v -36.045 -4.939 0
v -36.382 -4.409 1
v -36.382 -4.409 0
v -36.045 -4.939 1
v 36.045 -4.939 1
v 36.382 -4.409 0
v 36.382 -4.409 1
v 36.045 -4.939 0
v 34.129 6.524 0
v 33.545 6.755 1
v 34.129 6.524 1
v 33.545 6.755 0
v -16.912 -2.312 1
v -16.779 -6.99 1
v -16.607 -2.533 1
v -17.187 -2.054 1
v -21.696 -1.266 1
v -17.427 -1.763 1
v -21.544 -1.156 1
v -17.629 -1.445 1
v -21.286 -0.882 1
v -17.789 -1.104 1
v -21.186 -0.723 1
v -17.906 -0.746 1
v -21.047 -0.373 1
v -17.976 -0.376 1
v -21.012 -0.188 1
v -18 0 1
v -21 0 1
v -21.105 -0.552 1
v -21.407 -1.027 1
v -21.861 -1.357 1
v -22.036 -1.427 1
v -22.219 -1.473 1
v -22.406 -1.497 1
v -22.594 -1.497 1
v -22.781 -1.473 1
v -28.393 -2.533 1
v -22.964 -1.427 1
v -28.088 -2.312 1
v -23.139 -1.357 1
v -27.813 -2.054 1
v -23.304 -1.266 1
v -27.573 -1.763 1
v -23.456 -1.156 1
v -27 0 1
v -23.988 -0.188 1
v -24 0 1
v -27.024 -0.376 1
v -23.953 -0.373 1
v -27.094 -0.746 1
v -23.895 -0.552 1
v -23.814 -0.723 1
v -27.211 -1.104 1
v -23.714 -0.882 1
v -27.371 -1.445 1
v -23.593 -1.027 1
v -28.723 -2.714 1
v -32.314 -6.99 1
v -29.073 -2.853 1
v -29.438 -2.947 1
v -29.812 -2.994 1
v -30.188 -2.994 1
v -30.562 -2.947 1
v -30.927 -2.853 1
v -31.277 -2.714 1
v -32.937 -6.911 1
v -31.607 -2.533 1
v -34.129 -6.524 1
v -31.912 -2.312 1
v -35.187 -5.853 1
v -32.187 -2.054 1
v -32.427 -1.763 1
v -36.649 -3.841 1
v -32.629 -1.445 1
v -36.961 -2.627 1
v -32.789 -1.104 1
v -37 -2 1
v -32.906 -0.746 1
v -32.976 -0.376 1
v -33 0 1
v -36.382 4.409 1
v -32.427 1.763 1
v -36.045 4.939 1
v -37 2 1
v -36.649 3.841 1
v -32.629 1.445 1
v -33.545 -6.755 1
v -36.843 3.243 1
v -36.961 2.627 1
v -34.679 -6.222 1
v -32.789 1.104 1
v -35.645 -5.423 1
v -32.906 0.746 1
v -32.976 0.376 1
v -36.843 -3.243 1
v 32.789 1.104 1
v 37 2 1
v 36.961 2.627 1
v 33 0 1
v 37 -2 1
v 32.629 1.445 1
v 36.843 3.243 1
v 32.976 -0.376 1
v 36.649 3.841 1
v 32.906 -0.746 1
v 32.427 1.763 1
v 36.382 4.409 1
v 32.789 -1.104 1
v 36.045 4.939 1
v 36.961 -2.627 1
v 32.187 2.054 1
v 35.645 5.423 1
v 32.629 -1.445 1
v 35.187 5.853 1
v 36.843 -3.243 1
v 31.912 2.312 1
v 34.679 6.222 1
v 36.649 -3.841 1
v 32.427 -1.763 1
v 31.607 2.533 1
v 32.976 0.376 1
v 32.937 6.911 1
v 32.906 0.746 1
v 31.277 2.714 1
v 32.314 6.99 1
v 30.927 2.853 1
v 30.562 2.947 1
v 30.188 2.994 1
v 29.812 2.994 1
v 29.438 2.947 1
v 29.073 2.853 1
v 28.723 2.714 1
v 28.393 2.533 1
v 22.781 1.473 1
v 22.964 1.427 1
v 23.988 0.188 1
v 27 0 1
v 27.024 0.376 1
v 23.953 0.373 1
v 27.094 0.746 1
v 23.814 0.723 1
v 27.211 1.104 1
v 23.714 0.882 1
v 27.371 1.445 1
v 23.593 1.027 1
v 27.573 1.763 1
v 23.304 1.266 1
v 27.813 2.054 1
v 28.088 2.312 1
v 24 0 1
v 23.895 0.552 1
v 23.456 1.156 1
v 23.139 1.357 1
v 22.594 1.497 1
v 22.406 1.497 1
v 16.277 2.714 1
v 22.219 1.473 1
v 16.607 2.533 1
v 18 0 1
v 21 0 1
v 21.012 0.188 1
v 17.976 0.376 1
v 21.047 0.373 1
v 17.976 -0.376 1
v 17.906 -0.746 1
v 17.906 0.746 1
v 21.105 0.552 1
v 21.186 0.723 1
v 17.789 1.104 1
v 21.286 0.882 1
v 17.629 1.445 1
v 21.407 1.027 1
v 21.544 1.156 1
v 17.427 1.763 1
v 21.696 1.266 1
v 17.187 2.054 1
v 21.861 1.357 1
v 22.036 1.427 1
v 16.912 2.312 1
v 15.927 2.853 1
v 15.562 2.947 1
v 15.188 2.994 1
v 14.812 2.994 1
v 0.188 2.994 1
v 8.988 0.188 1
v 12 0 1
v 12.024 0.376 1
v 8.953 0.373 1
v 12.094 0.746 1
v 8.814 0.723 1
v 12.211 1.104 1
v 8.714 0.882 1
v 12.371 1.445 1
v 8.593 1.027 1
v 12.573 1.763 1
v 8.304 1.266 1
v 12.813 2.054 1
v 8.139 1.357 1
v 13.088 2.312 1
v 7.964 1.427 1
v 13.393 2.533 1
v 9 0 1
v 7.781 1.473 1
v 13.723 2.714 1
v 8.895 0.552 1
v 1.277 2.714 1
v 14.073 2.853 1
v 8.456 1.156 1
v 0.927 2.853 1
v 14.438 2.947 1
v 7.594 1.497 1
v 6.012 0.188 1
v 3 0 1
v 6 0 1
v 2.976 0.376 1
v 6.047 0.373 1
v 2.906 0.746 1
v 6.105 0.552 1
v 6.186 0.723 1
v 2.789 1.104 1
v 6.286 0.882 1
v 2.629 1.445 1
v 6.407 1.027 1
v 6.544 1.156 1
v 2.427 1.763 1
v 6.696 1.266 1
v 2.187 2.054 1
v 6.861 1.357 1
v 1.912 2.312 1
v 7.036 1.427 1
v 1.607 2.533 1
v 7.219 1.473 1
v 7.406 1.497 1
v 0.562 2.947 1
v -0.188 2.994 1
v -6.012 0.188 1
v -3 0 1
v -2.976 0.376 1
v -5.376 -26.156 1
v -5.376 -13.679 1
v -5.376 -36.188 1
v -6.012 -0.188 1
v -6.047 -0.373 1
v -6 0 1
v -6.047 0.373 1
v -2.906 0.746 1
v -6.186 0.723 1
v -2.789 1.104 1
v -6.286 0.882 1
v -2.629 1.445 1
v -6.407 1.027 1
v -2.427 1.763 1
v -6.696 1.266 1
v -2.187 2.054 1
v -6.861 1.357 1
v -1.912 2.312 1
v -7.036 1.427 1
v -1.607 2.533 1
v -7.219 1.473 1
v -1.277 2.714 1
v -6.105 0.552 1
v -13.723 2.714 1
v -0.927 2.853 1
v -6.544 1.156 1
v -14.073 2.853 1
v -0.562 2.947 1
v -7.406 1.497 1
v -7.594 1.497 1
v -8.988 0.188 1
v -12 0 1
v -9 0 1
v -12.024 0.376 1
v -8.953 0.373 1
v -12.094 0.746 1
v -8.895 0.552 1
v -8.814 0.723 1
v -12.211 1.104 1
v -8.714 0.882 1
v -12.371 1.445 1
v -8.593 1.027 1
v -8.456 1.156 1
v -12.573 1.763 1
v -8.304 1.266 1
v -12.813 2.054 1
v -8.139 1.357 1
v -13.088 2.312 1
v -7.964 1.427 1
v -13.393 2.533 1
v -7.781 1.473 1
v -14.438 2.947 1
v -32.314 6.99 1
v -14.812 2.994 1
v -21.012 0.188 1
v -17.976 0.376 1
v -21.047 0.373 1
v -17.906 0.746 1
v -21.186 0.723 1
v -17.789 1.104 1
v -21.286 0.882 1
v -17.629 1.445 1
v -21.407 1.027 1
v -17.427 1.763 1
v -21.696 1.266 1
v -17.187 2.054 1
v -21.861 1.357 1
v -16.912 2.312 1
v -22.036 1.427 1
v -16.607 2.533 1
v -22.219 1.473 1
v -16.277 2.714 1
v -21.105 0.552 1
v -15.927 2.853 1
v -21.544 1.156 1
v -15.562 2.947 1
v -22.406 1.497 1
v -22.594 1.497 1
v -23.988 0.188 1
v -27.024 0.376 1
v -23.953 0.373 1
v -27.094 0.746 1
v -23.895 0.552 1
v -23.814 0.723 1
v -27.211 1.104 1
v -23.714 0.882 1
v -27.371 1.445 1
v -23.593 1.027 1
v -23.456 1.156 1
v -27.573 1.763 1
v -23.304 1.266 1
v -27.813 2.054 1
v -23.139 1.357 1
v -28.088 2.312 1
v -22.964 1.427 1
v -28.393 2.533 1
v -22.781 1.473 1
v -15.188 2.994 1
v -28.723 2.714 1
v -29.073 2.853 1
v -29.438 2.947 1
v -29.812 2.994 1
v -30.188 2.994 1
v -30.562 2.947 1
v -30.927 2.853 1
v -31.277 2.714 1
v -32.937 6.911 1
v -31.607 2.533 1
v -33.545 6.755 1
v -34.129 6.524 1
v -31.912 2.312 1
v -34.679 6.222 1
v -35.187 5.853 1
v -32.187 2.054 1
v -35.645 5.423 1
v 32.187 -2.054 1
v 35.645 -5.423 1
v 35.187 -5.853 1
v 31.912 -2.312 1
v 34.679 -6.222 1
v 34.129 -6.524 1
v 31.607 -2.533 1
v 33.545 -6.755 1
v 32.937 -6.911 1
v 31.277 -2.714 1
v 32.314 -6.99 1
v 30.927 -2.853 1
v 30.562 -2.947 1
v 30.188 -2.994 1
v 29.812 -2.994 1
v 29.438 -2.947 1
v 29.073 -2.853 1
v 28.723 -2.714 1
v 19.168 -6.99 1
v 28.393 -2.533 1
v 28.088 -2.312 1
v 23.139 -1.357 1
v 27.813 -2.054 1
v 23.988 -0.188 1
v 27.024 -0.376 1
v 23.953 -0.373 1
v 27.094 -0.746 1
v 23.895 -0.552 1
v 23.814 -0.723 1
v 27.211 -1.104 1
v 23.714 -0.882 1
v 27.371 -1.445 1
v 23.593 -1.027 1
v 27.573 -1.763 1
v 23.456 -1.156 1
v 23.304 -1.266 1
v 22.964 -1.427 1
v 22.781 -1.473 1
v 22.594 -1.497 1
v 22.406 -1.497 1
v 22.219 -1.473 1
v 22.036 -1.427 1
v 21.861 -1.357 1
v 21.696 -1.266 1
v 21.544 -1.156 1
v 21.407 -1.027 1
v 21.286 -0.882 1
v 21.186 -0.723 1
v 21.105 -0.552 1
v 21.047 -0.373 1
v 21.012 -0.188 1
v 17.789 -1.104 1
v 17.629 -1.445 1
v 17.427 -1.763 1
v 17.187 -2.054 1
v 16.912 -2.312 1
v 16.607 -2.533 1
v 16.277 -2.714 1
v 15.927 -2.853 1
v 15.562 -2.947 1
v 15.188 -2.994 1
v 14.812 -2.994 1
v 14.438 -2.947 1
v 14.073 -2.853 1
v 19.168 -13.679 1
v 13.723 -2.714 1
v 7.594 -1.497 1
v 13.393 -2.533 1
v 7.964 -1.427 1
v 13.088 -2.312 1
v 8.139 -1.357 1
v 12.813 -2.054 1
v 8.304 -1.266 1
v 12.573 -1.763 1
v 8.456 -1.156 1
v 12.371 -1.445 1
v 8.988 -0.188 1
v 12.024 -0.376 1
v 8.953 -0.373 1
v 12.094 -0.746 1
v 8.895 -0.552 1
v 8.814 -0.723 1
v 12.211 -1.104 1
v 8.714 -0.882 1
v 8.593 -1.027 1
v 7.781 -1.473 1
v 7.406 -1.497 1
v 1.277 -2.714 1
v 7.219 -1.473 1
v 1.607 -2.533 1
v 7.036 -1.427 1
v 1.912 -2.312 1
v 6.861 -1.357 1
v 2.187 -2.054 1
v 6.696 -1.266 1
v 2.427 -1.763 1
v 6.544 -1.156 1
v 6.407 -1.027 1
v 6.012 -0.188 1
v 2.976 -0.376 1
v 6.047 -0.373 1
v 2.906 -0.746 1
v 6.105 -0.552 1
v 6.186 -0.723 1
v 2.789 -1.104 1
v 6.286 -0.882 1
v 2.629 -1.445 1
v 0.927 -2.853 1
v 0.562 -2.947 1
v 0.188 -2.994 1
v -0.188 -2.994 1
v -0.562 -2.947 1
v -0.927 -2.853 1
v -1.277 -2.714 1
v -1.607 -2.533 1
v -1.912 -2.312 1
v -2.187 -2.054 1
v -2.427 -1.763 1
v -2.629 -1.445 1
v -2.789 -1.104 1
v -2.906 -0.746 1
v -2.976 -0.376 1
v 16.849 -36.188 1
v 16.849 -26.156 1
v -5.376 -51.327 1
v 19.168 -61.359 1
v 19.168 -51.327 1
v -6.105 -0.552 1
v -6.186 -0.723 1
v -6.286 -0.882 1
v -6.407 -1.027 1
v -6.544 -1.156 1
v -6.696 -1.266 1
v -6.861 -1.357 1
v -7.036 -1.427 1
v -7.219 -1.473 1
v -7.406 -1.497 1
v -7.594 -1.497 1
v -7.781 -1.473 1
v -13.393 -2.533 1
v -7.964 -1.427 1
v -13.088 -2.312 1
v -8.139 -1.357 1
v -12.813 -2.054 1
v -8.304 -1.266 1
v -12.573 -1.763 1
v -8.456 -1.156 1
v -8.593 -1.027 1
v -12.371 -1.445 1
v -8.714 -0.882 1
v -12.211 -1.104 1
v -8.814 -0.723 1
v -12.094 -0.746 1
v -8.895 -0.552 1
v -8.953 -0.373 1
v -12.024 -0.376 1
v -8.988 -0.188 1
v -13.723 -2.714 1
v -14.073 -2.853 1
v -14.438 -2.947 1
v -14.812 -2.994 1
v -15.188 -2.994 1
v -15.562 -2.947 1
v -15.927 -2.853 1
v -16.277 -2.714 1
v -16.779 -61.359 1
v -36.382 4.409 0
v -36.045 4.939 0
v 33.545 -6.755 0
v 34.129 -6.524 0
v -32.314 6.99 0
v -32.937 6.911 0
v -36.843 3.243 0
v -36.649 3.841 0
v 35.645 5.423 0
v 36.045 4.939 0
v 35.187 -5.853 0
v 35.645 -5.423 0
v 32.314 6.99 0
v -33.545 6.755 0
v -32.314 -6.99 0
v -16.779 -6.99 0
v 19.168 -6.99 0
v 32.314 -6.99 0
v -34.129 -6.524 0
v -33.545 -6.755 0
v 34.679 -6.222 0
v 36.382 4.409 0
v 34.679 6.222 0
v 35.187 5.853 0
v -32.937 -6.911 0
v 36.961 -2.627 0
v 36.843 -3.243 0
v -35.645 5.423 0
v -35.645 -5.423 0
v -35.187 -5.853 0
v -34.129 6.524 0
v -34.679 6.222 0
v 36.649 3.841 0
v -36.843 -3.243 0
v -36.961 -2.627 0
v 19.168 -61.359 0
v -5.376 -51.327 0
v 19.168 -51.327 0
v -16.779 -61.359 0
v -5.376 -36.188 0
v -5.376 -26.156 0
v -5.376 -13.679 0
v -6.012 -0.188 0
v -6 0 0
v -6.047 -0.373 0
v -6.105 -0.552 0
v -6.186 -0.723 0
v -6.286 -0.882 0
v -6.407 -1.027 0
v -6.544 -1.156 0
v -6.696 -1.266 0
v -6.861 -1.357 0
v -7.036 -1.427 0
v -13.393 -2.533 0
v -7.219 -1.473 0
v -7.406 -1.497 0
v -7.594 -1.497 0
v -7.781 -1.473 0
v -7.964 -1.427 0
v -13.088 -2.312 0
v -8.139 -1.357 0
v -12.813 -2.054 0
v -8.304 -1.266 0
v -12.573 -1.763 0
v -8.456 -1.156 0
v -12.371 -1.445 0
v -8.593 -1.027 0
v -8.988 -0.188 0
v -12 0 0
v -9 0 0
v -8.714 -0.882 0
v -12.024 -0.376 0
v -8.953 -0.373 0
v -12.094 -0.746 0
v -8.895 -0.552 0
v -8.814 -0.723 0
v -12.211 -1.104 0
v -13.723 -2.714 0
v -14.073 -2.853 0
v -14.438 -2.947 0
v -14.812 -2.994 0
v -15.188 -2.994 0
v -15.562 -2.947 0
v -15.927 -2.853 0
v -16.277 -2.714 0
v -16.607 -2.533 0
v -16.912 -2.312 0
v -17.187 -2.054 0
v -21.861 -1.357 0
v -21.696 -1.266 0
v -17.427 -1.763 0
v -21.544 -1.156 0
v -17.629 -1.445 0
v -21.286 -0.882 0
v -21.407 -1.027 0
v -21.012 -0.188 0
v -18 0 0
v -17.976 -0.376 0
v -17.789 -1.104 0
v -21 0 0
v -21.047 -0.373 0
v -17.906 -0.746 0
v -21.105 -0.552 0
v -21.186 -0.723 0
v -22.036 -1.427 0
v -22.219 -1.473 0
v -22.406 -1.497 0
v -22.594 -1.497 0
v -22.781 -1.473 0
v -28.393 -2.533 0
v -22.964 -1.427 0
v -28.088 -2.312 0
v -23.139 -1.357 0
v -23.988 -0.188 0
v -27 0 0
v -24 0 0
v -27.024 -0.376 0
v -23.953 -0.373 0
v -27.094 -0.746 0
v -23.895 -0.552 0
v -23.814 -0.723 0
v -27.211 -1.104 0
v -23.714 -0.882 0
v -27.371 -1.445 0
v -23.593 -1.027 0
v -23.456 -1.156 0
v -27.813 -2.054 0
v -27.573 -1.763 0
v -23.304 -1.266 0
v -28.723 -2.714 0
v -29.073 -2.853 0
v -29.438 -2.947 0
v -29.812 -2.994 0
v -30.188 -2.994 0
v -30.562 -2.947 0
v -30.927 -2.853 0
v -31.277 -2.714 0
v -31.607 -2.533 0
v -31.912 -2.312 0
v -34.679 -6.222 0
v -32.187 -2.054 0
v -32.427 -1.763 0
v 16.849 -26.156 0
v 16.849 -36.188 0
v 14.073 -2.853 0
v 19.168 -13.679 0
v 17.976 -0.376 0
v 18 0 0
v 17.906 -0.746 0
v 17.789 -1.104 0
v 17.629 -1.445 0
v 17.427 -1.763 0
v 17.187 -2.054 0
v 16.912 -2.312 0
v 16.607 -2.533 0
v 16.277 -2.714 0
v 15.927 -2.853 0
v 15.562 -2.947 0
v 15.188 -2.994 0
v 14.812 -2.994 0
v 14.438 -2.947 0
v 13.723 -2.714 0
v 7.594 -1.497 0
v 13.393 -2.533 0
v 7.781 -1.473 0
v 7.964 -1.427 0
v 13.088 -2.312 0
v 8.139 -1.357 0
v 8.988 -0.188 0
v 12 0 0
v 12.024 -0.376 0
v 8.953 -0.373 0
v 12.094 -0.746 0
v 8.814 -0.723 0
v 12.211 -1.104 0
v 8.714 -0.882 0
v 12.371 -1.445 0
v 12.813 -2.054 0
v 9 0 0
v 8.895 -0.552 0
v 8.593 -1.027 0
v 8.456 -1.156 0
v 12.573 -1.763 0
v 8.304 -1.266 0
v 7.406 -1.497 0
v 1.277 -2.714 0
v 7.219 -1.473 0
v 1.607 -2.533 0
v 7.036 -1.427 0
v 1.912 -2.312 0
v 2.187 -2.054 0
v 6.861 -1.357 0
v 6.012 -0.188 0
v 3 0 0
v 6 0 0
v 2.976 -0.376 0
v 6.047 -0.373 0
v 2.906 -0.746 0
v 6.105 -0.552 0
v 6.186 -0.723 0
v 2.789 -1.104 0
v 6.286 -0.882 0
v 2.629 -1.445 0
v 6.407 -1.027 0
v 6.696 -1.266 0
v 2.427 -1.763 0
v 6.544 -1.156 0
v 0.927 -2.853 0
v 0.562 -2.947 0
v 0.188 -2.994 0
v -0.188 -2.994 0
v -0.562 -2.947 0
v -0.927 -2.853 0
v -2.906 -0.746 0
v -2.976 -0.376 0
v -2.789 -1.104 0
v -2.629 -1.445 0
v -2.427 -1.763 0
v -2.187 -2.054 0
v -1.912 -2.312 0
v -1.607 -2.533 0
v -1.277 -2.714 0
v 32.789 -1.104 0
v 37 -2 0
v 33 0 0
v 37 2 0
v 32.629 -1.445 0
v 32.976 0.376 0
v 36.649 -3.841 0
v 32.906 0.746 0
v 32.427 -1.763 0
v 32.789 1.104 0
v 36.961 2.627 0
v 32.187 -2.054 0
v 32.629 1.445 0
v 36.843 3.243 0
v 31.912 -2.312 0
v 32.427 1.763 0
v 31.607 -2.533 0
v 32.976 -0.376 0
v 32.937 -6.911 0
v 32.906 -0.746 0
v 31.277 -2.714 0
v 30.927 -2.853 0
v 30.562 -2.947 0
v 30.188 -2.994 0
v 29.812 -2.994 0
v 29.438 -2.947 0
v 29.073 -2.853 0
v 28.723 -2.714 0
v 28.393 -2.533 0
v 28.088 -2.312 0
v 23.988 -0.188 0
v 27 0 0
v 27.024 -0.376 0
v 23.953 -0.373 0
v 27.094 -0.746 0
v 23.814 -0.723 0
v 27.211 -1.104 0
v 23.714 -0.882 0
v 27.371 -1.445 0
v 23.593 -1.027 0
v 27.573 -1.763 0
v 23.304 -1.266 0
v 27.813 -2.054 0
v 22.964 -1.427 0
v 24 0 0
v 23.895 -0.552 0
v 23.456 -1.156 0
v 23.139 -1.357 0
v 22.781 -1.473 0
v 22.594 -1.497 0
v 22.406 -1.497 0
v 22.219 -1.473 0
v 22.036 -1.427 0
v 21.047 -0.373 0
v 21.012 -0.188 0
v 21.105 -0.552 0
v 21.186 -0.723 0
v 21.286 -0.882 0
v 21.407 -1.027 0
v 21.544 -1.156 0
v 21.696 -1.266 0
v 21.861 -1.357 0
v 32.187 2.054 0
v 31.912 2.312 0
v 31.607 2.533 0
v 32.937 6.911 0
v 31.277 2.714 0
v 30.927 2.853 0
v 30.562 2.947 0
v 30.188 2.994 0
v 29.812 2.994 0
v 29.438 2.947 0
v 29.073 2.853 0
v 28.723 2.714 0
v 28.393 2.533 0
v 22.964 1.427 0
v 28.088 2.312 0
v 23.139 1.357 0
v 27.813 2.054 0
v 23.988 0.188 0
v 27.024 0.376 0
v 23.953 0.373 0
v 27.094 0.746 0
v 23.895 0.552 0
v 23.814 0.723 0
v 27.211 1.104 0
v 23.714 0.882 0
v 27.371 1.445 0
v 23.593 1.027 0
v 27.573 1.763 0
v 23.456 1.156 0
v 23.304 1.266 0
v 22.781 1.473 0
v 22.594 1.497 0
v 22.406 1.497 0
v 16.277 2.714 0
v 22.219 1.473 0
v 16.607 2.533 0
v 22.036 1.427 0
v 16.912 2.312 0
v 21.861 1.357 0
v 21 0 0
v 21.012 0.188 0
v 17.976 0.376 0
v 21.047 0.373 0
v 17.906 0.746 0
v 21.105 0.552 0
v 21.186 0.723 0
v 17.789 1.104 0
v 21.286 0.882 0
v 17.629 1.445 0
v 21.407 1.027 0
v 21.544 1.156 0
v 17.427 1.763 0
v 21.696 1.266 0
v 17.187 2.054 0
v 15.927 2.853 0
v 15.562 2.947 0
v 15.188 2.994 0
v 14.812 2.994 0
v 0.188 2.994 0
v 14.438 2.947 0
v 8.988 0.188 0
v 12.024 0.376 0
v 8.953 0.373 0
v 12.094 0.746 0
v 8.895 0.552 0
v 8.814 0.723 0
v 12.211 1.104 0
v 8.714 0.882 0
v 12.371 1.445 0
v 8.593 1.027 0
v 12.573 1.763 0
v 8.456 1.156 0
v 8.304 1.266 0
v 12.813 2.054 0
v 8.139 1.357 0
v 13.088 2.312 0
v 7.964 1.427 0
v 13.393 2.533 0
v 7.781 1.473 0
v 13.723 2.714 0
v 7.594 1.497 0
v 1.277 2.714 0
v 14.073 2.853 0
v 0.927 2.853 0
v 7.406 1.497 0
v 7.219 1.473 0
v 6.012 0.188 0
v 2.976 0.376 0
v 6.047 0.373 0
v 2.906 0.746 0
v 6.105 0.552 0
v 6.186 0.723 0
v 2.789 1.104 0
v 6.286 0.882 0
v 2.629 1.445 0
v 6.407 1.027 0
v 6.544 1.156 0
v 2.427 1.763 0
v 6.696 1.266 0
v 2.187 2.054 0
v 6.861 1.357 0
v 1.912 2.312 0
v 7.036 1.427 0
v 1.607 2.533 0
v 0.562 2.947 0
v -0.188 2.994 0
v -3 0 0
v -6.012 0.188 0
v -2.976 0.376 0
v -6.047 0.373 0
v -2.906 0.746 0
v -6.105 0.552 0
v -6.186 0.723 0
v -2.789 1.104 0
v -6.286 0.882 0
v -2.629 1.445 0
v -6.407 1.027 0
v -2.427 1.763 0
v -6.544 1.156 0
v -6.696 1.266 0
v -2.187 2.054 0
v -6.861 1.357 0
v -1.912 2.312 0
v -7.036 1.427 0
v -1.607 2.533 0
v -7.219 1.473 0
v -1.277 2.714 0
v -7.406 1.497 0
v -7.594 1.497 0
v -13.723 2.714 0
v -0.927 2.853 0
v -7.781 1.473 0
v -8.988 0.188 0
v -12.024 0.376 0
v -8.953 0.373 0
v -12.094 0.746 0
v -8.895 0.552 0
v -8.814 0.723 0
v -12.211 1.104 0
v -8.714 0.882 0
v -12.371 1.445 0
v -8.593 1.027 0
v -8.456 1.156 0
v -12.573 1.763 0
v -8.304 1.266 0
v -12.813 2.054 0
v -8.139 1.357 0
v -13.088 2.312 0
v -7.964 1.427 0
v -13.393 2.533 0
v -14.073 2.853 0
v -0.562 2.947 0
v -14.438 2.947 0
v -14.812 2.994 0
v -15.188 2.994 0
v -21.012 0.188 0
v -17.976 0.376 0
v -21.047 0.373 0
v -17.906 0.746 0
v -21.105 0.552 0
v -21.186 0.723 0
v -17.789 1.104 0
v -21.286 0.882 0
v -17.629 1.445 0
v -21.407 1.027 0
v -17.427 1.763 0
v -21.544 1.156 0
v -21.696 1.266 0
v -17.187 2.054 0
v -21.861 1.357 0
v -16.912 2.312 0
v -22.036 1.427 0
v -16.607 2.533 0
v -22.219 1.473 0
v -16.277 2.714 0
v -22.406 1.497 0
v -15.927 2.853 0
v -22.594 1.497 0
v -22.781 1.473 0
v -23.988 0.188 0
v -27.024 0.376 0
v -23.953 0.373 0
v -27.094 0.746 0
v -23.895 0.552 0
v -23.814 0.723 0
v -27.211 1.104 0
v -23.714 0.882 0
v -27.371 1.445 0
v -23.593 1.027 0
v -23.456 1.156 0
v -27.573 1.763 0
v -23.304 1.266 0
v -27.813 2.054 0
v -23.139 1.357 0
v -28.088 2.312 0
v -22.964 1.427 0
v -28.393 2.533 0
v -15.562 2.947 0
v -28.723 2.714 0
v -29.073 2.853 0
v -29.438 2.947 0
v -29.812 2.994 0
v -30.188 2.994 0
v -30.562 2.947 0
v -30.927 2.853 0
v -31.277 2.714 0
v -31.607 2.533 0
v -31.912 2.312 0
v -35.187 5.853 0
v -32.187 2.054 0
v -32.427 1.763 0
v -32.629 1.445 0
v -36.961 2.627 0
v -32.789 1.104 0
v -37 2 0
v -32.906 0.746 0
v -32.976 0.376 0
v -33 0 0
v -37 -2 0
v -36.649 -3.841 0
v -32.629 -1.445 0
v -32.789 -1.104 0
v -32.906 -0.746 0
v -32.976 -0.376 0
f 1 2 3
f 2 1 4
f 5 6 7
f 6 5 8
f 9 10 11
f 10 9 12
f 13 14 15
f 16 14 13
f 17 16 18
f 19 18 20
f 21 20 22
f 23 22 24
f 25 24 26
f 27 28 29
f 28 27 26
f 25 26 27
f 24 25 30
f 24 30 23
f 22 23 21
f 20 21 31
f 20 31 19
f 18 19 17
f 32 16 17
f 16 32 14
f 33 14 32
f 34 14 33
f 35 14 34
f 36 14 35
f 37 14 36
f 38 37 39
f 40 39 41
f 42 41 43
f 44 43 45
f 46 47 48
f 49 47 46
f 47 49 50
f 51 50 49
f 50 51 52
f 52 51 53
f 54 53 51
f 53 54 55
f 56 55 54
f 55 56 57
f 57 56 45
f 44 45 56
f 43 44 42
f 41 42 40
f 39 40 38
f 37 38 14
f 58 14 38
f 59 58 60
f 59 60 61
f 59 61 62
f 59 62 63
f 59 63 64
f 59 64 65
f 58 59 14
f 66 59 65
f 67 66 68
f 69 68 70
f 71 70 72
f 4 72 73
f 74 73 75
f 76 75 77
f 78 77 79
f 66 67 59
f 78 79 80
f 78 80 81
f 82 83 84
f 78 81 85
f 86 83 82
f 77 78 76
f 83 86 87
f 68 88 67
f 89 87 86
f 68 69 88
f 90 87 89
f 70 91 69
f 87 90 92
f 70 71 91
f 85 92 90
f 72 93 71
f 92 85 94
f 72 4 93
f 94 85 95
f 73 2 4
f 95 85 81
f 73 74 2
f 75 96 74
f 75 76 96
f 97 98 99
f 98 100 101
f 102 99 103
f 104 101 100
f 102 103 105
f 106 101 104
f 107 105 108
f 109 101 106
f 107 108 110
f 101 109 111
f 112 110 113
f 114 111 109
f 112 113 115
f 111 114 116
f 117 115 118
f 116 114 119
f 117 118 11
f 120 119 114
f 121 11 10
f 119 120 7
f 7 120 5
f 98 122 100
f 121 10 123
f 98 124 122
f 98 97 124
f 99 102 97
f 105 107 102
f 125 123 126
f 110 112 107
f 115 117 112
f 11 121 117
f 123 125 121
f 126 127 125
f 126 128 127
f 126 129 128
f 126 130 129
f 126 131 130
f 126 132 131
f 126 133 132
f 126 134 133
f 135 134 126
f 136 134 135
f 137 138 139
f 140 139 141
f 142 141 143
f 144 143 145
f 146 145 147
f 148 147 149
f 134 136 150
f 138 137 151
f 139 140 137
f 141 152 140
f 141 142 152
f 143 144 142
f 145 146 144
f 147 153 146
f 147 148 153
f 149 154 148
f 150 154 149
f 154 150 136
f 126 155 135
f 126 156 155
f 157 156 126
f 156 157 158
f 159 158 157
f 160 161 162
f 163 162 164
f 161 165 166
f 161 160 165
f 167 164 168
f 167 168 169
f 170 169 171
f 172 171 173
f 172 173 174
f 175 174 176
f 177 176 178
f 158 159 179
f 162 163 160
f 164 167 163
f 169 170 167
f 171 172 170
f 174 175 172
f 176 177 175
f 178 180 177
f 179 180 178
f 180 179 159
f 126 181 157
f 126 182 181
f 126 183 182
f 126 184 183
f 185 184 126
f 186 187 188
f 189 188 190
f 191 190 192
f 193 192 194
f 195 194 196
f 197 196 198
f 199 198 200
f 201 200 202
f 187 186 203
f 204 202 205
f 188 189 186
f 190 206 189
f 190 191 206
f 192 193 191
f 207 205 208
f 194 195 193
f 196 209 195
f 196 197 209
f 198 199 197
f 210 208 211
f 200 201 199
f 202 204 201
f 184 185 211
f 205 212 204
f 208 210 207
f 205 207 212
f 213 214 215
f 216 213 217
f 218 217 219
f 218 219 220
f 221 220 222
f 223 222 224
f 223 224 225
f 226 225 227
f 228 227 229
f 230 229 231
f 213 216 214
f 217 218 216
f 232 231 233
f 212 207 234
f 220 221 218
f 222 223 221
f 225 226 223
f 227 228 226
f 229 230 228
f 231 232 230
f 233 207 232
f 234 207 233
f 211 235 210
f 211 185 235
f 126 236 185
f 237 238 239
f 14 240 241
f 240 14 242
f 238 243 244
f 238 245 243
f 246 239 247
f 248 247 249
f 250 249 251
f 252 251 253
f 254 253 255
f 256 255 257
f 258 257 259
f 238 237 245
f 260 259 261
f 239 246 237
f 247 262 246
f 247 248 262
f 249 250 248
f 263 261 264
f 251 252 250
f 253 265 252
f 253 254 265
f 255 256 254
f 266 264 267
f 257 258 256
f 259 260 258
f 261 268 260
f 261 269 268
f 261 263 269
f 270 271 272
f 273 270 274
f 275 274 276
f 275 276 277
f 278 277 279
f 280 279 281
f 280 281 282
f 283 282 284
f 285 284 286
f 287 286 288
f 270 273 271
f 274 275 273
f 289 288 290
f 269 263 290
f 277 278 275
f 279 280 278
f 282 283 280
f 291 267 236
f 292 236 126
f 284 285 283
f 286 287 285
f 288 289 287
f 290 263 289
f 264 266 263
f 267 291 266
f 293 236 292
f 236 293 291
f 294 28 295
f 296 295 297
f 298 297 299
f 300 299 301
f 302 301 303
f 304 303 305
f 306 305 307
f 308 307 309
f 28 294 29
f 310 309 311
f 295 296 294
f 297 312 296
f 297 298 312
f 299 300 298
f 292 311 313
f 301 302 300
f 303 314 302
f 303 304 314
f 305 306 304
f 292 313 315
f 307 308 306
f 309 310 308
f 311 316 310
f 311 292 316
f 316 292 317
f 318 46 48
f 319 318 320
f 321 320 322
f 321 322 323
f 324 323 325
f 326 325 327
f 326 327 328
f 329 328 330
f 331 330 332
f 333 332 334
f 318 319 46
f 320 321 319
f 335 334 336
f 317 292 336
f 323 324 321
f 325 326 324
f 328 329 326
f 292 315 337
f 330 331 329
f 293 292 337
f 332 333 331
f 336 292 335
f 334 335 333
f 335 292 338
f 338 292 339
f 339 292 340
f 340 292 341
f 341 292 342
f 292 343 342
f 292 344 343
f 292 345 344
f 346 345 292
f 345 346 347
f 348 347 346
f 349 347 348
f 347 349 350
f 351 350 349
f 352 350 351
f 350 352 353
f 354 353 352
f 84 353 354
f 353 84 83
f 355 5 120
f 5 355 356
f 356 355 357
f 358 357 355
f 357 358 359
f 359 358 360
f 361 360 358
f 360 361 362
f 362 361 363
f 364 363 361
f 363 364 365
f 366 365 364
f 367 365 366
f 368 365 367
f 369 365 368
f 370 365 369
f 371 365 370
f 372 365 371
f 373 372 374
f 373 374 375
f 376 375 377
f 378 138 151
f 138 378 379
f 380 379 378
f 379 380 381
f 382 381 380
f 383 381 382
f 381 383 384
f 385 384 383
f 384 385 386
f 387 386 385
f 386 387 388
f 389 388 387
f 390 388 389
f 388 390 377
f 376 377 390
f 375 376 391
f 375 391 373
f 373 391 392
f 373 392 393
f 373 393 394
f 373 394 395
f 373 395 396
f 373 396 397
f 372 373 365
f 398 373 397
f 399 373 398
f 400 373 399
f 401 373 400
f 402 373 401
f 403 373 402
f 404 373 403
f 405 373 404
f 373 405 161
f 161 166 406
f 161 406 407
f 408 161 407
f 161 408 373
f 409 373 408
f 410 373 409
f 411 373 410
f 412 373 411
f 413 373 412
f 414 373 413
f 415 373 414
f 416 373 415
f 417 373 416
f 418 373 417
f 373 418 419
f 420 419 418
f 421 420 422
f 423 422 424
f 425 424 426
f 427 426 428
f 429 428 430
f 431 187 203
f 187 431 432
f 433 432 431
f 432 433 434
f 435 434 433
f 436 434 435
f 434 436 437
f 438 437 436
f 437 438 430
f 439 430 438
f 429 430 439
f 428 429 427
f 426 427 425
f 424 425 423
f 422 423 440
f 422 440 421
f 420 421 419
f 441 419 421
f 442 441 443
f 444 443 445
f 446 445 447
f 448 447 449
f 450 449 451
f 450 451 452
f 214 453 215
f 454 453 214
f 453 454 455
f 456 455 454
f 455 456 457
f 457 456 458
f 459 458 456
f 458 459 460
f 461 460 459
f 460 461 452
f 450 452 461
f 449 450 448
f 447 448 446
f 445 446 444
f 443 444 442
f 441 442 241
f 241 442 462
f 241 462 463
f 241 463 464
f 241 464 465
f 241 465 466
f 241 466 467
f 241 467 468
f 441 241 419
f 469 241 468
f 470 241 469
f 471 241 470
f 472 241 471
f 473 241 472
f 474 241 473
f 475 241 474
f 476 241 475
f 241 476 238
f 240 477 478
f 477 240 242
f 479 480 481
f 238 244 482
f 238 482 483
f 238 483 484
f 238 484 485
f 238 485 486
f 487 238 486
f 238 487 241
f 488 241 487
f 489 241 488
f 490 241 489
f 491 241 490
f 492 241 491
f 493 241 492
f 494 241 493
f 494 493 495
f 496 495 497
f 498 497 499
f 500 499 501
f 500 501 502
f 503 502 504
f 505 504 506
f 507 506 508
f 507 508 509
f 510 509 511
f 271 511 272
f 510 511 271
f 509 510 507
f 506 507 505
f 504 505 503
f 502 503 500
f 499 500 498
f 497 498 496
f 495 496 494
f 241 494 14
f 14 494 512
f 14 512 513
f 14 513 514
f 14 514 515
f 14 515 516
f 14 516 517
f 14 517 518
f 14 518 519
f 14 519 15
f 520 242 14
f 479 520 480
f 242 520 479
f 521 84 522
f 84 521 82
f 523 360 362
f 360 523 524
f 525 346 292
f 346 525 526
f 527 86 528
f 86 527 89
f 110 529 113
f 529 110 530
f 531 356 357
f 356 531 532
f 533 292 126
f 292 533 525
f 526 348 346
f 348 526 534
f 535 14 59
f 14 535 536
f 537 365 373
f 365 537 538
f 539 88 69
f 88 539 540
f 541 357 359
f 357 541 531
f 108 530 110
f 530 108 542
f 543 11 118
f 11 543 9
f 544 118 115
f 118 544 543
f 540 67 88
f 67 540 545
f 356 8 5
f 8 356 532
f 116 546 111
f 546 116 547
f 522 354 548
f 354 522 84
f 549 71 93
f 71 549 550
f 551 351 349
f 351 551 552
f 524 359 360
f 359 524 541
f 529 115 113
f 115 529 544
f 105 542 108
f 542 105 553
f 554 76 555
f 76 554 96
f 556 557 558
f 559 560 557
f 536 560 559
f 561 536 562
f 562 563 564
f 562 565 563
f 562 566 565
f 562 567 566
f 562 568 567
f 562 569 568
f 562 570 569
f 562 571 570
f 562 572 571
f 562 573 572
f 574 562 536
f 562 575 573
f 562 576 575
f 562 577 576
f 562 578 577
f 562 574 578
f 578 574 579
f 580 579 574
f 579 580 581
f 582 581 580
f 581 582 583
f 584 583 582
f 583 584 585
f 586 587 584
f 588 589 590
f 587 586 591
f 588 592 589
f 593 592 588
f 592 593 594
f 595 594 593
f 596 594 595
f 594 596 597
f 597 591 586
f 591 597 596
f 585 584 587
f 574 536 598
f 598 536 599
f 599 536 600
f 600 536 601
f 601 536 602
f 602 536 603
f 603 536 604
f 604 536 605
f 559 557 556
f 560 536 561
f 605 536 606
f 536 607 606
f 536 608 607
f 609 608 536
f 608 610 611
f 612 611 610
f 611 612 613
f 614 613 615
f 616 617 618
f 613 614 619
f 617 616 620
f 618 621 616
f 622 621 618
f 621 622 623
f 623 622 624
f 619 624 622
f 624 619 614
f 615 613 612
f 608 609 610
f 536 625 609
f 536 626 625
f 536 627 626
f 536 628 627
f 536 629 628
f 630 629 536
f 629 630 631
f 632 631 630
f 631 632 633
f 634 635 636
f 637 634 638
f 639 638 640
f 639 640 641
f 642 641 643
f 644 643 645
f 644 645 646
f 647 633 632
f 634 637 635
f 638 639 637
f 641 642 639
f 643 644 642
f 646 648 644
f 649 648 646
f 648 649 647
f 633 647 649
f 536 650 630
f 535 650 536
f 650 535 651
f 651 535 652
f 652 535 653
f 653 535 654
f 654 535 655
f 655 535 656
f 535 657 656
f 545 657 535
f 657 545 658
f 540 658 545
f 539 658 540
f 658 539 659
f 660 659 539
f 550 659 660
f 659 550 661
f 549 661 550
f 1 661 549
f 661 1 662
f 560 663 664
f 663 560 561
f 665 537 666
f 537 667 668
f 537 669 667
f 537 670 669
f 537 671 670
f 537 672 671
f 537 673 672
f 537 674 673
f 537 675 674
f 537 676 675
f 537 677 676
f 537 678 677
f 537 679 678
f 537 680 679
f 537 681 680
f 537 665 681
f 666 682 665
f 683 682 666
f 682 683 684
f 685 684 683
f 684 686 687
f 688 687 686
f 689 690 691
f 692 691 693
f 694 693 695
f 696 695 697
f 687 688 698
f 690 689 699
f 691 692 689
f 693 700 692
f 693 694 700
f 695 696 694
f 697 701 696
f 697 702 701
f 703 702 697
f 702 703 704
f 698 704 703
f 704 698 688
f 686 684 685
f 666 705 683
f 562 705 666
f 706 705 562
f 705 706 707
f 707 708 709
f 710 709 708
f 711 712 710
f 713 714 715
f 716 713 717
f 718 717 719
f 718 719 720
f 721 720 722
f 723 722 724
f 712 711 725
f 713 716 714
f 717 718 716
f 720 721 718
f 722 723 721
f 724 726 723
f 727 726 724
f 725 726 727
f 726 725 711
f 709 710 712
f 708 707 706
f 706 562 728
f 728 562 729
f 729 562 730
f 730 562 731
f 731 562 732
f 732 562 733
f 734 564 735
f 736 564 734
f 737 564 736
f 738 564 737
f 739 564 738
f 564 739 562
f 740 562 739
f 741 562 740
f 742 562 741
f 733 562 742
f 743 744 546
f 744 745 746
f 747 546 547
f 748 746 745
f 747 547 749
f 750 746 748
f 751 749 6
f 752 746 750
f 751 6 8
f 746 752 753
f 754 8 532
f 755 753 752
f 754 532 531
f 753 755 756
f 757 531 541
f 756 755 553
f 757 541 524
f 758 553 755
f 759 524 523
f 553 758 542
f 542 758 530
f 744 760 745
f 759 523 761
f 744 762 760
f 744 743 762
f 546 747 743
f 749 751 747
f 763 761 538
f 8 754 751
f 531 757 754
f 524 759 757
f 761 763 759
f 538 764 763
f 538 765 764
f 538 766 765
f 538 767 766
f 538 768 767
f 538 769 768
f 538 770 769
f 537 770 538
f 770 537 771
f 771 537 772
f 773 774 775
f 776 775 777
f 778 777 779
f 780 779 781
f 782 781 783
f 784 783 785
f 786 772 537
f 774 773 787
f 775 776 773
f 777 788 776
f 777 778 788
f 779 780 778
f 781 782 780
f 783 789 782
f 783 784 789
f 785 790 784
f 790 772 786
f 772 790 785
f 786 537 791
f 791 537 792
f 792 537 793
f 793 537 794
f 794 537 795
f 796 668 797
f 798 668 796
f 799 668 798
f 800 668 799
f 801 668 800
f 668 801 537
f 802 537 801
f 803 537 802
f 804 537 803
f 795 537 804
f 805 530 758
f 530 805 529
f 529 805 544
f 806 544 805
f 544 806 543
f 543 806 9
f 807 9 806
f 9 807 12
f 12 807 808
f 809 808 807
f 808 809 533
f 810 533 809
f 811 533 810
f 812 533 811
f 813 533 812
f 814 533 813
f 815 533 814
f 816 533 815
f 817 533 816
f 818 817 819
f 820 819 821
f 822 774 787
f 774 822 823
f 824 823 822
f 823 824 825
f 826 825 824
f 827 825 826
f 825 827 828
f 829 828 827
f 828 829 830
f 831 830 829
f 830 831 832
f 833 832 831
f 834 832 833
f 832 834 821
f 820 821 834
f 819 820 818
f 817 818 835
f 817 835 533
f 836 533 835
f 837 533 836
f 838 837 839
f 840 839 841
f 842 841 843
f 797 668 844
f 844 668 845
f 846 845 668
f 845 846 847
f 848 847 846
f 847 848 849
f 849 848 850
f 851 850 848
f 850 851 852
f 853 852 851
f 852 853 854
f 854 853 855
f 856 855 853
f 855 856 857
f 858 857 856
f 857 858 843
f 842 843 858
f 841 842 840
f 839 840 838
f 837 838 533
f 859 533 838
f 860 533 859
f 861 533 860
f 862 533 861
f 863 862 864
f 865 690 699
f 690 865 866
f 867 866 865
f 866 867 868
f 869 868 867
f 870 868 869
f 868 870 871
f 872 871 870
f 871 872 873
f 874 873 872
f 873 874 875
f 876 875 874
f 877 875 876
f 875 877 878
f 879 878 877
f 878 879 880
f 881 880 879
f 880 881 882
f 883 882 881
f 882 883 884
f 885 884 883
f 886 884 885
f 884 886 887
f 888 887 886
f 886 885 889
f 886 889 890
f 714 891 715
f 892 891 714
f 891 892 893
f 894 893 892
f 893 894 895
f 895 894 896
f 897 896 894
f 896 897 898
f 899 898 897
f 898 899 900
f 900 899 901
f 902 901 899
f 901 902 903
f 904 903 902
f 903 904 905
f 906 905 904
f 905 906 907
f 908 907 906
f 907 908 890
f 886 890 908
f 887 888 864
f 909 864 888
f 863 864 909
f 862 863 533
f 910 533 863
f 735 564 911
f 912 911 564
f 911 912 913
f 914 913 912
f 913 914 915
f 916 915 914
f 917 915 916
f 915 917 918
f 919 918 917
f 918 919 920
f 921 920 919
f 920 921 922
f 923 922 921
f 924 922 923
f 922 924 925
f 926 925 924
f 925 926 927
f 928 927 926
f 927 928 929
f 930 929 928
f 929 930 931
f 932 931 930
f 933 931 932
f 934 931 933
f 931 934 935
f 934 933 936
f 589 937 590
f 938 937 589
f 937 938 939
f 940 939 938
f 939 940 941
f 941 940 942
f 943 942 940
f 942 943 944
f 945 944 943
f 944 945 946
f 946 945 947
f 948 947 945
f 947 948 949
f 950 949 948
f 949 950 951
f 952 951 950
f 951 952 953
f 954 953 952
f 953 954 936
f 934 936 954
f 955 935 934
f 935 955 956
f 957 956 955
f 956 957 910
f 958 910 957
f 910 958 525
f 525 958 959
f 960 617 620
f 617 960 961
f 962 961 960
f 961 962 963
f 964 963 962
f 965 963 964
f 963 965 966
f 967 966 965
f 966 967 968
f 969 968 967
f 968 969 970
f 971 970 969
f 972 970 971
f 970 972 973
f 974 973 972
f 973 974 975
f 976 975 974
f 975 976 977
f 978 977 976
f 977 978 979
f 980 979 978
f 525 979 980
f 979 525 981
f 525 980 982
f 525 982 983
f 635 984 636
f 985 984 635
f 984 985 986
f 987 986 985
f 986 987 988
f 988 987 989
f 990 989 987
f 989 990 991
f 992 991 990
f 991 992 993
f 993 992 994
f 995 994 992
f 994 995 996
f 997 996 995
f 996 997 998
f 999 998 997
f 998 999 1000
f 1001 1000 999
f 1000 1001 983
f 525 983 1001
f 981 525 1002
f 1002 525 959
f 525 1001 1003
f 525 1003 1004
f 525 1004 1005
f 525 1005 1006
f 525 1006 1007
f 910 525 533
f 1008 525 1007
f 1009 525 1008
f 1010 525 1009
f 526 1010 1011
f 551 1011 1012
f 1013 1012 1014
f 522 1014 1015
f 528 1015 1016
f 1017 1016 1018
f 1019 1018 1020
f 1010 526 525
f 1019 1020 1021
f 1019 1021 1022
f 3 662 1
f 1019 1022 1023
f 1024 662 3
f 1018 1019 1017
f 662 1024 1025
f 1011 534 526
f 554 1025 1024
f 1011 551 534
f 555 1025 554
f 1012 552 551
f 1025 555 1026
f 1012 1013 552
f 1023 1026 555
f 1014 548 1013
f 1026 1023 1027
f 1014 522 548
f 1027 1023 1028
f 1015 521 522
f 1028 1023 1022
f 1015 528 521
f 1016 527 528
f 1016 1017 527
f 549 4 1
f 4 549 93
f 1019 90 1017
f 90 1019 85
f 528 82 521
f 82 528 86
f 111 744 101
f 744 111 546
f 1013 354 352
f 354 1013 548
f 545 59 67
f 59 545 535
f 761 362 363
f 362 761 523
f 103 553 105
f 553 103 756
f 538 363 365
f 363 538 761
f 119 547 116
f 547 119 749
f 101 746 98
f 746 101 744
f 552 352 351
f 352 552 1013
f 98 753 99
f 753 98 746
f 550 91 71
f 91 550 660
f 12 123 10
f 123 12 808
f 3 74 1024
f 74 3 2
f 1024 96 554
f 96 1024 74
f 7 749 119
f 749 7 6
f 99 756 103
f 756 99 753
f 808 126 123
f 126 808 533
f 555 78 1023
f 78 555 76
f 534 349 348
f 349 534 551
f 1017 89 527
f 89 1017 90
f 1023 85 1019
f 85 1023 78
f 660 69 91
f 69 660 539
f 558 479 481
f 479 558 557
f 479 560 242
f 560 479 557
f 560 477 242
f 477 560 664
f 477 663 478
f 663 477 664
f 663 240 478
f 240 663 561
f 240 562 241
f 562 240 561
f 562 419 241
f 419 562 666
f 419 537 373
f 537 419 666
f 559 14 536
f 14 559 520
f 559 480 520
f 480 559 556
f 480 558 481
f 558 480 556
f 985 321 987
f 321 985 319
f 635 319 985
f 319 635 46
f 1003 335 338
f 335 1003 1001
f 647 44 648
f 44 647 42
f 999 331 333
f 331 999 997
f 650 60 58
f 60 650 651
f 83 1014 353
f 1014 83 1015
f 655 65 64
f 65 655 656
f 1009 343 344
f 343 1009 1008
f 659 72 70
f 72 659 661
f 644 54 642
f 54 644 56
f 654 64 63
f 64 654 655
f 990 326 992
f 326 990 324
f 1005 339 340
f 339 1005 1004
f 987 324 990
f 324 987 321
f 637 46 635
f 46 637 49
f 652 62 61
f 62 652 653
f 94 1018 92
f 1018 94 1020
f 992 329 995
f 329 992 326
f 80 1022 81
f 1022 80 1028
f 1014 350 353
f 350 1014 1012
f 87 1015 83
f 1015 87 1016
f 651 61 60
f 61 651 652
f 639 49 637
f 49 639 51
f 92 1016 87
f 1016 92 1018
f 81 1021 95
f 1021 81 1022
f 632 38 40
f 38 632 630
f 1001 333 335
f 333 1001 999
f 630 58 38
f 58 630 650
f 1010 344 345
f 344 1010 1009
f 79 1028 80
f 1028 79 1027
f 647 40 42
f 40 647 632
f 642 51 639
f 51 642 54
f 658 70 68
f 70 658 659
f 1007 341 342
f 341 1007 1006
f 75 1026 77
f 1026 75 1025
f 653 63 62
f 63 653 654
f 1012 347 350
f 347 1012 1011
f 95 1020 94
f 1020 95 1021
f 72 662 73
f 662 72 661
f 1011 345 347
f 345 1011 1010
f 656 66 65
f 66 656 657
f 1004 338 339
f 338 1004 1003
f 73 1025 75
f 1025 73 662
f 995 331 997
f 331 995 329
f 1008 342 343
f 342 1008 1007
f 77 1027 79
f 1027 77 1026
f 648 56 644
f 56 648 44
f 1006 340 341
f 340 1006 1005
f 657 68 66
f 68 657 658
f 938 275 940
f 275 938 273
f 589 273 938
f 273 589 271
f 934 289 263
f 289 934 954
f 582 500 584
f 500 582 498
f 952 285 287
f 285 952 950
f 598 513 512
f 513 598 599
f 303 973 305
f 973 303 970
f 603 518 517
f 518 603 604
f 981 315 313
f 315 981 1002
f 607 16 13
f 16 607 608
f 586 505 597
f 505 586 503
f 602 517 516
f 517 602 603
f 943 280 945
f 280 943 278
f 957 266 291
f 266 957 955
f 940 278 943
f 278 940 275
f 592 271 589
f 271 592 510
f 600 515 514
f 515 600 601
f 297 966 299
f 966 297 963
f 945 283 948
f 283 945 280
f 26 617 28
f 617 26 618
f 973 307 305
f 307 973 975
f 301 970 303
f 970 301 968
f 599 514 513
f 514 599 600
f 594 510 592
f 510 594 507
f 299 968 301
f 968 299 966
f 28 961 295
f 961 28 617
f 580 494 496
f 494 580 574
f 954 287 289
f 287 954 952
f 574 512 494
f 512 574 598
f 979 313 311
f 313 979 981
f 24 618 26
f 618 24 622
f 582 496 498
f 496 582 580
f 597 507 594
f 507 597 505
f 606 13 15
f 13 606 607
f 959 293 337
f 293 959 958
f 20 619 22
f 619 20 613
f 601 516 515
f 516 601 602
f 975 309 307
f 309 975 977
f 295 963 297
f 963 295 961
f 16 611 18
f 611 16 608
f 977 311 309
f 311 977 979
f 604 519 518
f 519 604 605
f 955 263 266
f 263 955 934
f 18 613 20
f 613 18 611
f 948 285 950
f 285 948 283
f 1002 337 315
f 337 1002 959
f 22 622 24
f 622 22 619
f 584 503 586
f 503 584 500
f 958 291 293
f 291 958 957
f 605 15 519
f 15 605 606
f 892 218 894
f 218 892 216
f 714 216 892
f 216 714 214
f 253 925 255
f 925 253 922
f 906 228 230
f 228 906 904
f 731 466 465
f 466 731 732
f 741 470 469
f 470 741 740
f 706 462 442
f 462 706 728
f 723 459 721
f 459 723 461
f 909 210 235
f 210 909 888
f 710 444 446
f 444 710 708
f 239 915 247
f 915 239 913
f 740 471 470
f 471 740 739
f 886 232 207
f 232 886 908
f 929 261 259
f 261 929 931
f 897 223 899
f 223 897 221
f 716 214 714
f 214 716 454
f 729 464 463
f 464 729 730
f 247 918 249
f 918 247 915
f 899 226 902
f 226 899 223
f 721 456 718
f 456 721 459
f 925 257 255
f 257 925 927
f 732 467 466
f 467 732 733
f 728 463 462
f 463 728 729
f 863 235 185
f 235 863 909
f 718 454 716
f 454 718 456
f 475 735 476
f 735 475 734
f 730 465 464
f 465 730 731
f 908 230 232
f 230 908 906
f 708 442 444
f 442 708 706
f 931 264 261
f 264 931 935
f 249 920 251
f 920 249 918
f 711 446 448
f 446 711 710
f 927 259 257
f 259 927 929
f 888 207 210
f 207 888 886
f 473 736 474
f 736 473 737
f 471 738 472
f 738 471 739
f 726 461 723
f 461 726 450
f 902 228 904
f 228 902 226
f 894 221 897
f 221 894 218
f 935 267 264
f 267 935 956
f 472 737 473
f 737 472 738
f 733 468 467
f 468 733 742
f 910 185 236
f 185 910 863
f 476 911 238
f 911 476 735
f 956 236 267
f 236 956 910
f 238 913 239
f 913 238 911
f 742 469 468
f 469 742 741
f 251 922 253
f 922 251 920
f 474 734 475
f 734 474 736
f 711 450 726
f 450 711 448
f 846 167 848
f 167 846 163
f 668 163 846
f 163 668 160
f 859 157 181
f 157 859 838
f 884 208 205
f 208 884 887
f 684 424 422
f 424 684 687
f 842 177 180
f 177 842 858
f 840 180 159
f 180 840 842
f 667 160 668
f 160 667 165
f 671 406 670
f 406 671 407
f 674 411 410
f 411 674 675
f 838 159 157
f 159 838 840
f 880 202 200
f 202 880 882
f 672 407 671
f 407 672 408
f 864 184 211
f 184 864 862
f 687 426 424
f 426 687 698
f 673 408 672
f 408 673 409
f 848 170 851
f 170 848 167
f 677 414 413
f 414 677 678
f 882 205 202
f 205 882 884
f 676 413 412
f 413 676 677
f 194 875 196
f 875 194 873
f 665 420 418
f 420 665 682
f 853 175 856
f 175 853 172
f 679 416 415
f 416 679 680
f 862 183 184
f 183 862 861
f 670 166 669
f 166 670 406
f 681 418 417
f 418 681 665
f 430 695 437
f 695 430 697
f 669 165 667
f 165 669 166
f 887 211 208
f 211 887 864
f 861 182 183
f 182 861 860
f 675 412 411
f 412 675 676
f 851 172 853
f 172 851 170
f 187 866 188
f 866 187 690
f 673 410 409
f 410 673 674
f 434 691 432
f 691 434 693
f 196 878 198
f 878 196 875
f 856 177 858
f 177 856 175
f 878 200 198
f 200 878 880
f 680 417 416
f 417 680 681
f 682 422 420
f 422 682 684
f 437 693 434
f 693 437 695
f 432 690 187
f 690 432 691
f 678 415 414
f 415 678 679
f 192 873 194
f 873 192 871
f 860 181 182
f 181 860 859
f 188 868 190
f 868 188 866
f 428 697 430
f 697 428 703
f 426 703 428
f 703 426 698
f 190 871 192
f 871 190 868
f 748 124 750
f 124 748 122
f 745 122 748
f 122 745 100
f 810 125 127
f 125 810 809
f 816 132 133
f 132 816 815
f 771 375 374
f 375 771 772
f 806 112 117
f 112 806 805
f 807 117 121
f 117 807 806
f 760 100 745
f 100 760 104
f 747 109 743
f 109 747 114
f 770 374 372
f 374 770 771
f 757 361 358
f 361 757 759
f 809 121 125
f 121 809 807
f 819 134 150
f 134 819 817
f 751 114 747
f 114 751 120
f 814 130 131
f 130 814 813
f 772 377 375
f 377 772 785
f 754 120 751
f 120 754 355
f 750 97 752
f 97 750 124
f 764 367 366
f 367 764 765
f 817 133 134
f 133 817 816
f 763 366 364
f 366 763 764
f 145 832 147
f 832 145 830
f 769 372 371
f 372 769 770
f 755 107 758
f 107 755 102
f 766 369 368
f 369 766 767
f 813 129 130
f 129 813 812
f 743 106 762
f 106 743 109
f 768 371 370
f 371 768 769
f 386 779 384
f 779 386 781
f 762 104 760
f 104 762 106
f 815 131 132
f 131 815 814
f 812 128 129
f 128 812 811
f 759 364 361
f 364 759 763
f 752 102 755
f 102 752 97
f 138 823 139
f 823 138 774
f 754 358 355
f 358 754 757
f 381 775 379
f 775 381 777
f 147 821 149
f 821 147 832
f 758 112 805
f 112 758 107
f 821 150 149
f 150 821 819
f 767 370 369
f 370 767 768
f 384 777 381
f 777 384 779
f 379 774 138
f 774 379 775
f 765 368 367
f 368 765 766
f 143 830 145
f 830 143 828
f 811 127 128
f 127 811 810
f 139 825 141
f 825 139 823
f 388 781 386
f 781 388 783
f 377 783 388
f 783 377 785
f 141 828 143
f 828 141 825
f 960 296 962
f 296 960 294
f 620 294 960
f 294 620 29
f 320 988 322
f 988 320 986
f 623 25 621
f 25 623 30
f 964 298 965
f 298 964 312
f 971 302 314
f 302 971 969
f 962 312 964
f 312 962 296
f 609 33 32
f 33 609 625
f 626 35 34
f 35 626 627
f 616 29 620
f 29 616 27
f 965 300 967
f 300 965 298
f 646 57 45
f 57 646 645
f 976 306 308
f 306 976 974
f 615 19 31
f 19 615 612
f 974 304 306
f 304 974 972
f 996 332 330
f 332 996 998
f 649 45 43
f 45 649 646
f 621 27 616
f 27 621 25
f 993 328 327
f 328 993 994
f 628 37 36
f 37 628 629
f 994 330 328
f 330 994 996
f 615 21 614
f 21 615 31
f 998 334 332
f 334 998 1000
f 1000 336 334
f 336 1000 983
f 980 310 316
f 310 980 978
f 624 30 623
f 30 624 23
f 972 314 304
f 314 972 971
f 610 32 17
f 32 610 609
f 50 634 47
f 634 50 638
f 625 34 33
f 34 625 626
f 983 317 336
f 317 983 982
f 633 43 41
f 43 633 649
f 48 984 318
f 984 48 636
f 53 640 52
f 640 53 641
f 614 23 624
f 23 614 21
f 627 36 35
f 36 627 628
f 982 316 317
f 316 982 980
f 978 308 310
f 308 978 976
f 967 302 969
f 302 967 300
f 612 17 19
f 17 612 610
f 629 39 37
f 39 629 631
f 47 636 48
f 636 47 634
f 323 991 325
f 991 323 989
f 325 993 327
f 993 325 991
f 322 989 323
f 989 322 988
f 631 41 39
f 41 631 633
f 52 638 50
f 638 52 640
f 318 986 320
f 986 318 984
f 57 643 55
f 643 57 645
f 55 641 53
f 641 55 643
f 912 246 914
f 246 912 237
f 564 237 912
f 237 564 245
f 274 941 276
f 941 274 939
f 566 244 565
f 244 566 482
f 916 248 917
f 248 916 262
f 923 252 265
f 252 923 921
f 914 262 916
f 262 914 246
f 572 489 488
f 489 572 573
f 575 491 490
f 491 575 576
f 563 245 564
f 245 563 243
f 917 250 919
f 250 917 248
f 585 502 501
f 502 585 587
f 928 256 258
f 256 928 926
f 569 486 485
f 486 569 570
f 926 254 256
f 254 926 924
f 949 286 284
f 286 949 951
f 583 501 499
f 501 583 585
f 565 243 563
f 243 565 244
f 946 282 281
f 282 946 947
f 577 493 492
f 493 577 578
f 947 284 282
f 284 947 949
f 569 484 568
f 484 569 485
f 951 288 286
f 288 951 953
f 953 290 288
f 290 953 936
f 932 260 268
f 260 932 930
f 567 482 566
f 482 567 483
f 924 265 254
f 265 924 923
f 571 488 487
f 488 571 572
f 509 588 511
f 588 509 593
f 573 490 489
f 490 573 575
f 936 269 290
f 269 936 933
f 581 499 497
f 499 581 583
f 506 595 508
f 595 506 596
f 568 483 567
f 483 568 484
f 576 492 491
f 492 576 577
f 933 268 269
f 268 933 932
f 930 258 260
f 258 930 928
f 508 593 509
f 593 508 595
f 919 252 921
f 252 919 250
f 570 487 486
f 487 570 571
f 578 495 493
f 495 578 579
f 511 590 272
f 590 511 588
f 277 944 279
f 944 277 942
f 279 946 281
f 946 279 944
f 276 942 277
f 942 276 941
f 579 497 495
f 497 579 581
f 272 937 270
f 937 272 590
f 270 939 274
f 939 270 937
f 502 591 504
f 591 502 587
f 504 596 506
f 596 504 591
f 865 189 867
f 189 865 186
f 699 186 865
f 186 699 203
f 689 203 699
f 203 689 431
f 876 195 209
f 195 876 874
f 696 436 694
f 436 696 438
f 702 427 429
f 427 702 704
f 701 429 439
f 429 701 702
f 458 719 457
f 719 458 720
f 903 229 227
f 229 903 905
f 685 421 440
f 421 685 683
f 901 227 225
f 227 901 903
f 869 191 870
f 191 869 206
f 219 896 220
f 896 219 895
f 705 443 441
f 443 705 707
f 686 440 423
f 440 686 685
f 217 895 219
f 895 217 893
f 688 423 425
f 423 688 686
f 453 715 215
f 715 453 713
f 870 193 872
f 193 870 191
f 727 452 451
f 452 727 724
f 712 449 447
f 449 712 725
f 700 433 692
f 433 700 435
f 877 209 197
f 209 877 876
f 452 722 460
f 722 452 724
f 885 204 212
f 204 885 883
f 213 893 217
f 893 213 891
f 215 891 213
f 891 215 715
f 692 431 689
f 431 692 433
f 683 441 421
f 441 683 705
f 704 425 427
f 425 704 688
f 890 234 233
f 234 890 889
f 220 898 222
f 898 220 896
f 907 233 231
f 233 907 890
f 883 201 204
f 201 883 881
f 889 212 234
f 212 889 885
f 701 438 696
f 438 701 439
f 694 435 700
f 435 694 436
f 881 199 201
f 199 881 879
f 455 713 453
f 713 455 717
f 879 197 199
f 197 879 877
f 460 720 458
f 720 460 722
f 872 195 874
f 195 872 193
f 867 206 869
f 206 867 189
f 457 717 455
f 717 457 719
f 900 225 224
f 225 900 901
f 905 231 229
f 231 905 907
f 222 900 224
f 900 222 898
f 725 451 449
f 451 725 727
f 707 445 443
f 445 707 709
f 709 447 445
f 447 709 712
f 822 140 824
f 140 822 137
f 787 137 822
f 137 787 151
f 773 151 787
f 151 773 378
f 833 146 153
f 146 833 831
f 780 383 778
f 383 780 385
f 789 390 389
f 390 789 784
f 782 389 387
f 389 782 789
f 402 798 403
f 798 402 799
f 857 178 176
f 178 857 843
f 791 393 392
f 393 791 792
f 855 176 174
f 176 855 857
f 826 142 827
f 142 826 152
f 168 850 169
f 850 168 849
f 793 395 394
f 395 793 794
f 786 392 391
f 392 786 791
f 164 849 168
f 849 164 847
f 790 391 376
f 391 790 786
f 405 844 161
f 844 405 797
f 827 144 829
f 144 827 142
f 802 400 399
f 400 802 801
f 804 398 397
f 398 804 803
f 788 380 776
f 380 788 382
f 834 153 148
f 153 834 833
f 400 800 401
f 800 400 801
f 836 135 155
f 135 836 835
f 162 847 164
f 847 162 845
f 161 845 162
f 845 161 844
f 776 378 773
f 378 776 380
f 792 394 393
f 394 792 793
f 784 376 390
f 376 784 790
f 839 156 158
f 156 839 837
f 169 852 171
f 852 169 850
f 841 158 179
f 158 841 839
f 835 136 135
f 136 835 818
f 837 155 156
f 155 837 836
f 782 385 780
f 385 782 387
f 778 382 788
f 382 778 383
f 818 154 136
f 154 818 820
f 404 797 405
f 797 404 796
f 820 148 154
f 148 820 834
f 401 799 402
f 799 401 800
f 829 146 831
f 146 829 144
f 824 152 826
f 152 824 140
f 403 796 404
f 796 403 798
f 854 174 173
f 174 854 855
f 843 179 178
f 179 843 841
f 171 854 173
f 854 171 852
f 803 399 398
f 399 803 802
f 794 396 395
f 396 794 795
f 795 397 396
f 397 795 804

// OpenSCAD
$fn = 50;


difference() {
	union() {
		hull() {
			translate(v = [-32.0000000000, 2.0000000000, 0]) {
				cylinder(h = 1, r = 5);
			}
			translate(v = [32.0000000000, 2.0000000000, 0]) {
				cylinder(h = 1, r = 5);
			}
			translate(v = [-32.0000000000, -2.0000000000, 0]) {
				cylinder(h = 1, r = 5);
			}
			translate(v = [32.0000000000, -2.0000000000, 0]) {
				cylinder(h = 1, r = 5);
			}
		}
		translate(v = [0, -5, 0]) {
			linear_extrude(height = 1) {
				text(font = "DejaVu Sans Mono:style=Bold", halign = "center", size = 57.0000000000, text = "E", valign = "top");
			}
		}
	}
	union() {
		translate(v = [-30.0000000000, 0.0000000000, 0]) {
			translate(v = [0, 0, -100]) {
				cylinder(h = 200, r = 3.0000000000);
			}
		}
		translate(v = [-15.0000000000, 0.0000000000, 0]) {
			translate(v = [0, 0, -100]) {
				cylinder(h = 200, r = 3.0000000000);
			}
		}
		translate(v = [0, 0, -100]) {
			cylinder(h = 200, r = 3.0000000000);
		}
		translate(v = [15.0000000000, 0.0000000000, 0]) {
			translate(v = [0, 0, -100]) {
				cylinder(h = 200, r = 3.0000000000);
			}
		}
		translate(v = [30.0000000000, 0.0000000000, 0]) {
			translate(v = [0, 0, -100]) {
				cylinder(h = 200, r = 3.0000000000);
			}
		}
		translate(v = [-30.0000000000, 0.0000000000, 0]) {
			translate(v = [0, 0, -100]) {
				cylinder(h = 200, r = 1.5000000000);
			}
		}
		translate(v = [-22.5000000000, 0.0000000000, 0]) {
			translate(v = [0, 0, -100]) {
				cylinder(h = 200, r = 1.5000000000);
			}
		}
		translate(v = [-15.0000000000, 0.0000000000, 0]) {
			translate(v = [0, 0, -100]) {
				cylinder(h = 200, r = 1.5000000000);
			}
		}
		translate(v = [-7.5000000000, 0.0000000000, 0]) {
			translate(v = [0, 0, -100]) {
				cylinder(h = 200, r = 1.5000000000);
			}
		}
		translate(v = [0, 0, -100]) {
			cylinder(h = 200, r = 1.5000000000);
		}
		translate(v = [7.5000000000, 0.0000000000, 0]) {
			translate(v = [0, 0, -100]) {
				cylinder(h = 200, r = 1.5000000000);
			}
		}
		translate(v = [15.0000000000, 0.0000000000, 0]) {
			translate(v = [0, 0, -100]) {
				cylinder(h = 200, r = 1.5000000000);
			}
		}
		translate(v = [22.5000000000, 0.0000000000, 0]) {
			translate(v = [0, 0, -100]) {
				cylinder(h = 200, r = 1.5000000000);
			}
		}
		translate(v = [30.0000000000, 0.0000000000, 0]) {
			translate(v = [0, 0, -100]) {
				cylinder(h = 200, r = 1.5000000000);
			}
		}
	}
}
